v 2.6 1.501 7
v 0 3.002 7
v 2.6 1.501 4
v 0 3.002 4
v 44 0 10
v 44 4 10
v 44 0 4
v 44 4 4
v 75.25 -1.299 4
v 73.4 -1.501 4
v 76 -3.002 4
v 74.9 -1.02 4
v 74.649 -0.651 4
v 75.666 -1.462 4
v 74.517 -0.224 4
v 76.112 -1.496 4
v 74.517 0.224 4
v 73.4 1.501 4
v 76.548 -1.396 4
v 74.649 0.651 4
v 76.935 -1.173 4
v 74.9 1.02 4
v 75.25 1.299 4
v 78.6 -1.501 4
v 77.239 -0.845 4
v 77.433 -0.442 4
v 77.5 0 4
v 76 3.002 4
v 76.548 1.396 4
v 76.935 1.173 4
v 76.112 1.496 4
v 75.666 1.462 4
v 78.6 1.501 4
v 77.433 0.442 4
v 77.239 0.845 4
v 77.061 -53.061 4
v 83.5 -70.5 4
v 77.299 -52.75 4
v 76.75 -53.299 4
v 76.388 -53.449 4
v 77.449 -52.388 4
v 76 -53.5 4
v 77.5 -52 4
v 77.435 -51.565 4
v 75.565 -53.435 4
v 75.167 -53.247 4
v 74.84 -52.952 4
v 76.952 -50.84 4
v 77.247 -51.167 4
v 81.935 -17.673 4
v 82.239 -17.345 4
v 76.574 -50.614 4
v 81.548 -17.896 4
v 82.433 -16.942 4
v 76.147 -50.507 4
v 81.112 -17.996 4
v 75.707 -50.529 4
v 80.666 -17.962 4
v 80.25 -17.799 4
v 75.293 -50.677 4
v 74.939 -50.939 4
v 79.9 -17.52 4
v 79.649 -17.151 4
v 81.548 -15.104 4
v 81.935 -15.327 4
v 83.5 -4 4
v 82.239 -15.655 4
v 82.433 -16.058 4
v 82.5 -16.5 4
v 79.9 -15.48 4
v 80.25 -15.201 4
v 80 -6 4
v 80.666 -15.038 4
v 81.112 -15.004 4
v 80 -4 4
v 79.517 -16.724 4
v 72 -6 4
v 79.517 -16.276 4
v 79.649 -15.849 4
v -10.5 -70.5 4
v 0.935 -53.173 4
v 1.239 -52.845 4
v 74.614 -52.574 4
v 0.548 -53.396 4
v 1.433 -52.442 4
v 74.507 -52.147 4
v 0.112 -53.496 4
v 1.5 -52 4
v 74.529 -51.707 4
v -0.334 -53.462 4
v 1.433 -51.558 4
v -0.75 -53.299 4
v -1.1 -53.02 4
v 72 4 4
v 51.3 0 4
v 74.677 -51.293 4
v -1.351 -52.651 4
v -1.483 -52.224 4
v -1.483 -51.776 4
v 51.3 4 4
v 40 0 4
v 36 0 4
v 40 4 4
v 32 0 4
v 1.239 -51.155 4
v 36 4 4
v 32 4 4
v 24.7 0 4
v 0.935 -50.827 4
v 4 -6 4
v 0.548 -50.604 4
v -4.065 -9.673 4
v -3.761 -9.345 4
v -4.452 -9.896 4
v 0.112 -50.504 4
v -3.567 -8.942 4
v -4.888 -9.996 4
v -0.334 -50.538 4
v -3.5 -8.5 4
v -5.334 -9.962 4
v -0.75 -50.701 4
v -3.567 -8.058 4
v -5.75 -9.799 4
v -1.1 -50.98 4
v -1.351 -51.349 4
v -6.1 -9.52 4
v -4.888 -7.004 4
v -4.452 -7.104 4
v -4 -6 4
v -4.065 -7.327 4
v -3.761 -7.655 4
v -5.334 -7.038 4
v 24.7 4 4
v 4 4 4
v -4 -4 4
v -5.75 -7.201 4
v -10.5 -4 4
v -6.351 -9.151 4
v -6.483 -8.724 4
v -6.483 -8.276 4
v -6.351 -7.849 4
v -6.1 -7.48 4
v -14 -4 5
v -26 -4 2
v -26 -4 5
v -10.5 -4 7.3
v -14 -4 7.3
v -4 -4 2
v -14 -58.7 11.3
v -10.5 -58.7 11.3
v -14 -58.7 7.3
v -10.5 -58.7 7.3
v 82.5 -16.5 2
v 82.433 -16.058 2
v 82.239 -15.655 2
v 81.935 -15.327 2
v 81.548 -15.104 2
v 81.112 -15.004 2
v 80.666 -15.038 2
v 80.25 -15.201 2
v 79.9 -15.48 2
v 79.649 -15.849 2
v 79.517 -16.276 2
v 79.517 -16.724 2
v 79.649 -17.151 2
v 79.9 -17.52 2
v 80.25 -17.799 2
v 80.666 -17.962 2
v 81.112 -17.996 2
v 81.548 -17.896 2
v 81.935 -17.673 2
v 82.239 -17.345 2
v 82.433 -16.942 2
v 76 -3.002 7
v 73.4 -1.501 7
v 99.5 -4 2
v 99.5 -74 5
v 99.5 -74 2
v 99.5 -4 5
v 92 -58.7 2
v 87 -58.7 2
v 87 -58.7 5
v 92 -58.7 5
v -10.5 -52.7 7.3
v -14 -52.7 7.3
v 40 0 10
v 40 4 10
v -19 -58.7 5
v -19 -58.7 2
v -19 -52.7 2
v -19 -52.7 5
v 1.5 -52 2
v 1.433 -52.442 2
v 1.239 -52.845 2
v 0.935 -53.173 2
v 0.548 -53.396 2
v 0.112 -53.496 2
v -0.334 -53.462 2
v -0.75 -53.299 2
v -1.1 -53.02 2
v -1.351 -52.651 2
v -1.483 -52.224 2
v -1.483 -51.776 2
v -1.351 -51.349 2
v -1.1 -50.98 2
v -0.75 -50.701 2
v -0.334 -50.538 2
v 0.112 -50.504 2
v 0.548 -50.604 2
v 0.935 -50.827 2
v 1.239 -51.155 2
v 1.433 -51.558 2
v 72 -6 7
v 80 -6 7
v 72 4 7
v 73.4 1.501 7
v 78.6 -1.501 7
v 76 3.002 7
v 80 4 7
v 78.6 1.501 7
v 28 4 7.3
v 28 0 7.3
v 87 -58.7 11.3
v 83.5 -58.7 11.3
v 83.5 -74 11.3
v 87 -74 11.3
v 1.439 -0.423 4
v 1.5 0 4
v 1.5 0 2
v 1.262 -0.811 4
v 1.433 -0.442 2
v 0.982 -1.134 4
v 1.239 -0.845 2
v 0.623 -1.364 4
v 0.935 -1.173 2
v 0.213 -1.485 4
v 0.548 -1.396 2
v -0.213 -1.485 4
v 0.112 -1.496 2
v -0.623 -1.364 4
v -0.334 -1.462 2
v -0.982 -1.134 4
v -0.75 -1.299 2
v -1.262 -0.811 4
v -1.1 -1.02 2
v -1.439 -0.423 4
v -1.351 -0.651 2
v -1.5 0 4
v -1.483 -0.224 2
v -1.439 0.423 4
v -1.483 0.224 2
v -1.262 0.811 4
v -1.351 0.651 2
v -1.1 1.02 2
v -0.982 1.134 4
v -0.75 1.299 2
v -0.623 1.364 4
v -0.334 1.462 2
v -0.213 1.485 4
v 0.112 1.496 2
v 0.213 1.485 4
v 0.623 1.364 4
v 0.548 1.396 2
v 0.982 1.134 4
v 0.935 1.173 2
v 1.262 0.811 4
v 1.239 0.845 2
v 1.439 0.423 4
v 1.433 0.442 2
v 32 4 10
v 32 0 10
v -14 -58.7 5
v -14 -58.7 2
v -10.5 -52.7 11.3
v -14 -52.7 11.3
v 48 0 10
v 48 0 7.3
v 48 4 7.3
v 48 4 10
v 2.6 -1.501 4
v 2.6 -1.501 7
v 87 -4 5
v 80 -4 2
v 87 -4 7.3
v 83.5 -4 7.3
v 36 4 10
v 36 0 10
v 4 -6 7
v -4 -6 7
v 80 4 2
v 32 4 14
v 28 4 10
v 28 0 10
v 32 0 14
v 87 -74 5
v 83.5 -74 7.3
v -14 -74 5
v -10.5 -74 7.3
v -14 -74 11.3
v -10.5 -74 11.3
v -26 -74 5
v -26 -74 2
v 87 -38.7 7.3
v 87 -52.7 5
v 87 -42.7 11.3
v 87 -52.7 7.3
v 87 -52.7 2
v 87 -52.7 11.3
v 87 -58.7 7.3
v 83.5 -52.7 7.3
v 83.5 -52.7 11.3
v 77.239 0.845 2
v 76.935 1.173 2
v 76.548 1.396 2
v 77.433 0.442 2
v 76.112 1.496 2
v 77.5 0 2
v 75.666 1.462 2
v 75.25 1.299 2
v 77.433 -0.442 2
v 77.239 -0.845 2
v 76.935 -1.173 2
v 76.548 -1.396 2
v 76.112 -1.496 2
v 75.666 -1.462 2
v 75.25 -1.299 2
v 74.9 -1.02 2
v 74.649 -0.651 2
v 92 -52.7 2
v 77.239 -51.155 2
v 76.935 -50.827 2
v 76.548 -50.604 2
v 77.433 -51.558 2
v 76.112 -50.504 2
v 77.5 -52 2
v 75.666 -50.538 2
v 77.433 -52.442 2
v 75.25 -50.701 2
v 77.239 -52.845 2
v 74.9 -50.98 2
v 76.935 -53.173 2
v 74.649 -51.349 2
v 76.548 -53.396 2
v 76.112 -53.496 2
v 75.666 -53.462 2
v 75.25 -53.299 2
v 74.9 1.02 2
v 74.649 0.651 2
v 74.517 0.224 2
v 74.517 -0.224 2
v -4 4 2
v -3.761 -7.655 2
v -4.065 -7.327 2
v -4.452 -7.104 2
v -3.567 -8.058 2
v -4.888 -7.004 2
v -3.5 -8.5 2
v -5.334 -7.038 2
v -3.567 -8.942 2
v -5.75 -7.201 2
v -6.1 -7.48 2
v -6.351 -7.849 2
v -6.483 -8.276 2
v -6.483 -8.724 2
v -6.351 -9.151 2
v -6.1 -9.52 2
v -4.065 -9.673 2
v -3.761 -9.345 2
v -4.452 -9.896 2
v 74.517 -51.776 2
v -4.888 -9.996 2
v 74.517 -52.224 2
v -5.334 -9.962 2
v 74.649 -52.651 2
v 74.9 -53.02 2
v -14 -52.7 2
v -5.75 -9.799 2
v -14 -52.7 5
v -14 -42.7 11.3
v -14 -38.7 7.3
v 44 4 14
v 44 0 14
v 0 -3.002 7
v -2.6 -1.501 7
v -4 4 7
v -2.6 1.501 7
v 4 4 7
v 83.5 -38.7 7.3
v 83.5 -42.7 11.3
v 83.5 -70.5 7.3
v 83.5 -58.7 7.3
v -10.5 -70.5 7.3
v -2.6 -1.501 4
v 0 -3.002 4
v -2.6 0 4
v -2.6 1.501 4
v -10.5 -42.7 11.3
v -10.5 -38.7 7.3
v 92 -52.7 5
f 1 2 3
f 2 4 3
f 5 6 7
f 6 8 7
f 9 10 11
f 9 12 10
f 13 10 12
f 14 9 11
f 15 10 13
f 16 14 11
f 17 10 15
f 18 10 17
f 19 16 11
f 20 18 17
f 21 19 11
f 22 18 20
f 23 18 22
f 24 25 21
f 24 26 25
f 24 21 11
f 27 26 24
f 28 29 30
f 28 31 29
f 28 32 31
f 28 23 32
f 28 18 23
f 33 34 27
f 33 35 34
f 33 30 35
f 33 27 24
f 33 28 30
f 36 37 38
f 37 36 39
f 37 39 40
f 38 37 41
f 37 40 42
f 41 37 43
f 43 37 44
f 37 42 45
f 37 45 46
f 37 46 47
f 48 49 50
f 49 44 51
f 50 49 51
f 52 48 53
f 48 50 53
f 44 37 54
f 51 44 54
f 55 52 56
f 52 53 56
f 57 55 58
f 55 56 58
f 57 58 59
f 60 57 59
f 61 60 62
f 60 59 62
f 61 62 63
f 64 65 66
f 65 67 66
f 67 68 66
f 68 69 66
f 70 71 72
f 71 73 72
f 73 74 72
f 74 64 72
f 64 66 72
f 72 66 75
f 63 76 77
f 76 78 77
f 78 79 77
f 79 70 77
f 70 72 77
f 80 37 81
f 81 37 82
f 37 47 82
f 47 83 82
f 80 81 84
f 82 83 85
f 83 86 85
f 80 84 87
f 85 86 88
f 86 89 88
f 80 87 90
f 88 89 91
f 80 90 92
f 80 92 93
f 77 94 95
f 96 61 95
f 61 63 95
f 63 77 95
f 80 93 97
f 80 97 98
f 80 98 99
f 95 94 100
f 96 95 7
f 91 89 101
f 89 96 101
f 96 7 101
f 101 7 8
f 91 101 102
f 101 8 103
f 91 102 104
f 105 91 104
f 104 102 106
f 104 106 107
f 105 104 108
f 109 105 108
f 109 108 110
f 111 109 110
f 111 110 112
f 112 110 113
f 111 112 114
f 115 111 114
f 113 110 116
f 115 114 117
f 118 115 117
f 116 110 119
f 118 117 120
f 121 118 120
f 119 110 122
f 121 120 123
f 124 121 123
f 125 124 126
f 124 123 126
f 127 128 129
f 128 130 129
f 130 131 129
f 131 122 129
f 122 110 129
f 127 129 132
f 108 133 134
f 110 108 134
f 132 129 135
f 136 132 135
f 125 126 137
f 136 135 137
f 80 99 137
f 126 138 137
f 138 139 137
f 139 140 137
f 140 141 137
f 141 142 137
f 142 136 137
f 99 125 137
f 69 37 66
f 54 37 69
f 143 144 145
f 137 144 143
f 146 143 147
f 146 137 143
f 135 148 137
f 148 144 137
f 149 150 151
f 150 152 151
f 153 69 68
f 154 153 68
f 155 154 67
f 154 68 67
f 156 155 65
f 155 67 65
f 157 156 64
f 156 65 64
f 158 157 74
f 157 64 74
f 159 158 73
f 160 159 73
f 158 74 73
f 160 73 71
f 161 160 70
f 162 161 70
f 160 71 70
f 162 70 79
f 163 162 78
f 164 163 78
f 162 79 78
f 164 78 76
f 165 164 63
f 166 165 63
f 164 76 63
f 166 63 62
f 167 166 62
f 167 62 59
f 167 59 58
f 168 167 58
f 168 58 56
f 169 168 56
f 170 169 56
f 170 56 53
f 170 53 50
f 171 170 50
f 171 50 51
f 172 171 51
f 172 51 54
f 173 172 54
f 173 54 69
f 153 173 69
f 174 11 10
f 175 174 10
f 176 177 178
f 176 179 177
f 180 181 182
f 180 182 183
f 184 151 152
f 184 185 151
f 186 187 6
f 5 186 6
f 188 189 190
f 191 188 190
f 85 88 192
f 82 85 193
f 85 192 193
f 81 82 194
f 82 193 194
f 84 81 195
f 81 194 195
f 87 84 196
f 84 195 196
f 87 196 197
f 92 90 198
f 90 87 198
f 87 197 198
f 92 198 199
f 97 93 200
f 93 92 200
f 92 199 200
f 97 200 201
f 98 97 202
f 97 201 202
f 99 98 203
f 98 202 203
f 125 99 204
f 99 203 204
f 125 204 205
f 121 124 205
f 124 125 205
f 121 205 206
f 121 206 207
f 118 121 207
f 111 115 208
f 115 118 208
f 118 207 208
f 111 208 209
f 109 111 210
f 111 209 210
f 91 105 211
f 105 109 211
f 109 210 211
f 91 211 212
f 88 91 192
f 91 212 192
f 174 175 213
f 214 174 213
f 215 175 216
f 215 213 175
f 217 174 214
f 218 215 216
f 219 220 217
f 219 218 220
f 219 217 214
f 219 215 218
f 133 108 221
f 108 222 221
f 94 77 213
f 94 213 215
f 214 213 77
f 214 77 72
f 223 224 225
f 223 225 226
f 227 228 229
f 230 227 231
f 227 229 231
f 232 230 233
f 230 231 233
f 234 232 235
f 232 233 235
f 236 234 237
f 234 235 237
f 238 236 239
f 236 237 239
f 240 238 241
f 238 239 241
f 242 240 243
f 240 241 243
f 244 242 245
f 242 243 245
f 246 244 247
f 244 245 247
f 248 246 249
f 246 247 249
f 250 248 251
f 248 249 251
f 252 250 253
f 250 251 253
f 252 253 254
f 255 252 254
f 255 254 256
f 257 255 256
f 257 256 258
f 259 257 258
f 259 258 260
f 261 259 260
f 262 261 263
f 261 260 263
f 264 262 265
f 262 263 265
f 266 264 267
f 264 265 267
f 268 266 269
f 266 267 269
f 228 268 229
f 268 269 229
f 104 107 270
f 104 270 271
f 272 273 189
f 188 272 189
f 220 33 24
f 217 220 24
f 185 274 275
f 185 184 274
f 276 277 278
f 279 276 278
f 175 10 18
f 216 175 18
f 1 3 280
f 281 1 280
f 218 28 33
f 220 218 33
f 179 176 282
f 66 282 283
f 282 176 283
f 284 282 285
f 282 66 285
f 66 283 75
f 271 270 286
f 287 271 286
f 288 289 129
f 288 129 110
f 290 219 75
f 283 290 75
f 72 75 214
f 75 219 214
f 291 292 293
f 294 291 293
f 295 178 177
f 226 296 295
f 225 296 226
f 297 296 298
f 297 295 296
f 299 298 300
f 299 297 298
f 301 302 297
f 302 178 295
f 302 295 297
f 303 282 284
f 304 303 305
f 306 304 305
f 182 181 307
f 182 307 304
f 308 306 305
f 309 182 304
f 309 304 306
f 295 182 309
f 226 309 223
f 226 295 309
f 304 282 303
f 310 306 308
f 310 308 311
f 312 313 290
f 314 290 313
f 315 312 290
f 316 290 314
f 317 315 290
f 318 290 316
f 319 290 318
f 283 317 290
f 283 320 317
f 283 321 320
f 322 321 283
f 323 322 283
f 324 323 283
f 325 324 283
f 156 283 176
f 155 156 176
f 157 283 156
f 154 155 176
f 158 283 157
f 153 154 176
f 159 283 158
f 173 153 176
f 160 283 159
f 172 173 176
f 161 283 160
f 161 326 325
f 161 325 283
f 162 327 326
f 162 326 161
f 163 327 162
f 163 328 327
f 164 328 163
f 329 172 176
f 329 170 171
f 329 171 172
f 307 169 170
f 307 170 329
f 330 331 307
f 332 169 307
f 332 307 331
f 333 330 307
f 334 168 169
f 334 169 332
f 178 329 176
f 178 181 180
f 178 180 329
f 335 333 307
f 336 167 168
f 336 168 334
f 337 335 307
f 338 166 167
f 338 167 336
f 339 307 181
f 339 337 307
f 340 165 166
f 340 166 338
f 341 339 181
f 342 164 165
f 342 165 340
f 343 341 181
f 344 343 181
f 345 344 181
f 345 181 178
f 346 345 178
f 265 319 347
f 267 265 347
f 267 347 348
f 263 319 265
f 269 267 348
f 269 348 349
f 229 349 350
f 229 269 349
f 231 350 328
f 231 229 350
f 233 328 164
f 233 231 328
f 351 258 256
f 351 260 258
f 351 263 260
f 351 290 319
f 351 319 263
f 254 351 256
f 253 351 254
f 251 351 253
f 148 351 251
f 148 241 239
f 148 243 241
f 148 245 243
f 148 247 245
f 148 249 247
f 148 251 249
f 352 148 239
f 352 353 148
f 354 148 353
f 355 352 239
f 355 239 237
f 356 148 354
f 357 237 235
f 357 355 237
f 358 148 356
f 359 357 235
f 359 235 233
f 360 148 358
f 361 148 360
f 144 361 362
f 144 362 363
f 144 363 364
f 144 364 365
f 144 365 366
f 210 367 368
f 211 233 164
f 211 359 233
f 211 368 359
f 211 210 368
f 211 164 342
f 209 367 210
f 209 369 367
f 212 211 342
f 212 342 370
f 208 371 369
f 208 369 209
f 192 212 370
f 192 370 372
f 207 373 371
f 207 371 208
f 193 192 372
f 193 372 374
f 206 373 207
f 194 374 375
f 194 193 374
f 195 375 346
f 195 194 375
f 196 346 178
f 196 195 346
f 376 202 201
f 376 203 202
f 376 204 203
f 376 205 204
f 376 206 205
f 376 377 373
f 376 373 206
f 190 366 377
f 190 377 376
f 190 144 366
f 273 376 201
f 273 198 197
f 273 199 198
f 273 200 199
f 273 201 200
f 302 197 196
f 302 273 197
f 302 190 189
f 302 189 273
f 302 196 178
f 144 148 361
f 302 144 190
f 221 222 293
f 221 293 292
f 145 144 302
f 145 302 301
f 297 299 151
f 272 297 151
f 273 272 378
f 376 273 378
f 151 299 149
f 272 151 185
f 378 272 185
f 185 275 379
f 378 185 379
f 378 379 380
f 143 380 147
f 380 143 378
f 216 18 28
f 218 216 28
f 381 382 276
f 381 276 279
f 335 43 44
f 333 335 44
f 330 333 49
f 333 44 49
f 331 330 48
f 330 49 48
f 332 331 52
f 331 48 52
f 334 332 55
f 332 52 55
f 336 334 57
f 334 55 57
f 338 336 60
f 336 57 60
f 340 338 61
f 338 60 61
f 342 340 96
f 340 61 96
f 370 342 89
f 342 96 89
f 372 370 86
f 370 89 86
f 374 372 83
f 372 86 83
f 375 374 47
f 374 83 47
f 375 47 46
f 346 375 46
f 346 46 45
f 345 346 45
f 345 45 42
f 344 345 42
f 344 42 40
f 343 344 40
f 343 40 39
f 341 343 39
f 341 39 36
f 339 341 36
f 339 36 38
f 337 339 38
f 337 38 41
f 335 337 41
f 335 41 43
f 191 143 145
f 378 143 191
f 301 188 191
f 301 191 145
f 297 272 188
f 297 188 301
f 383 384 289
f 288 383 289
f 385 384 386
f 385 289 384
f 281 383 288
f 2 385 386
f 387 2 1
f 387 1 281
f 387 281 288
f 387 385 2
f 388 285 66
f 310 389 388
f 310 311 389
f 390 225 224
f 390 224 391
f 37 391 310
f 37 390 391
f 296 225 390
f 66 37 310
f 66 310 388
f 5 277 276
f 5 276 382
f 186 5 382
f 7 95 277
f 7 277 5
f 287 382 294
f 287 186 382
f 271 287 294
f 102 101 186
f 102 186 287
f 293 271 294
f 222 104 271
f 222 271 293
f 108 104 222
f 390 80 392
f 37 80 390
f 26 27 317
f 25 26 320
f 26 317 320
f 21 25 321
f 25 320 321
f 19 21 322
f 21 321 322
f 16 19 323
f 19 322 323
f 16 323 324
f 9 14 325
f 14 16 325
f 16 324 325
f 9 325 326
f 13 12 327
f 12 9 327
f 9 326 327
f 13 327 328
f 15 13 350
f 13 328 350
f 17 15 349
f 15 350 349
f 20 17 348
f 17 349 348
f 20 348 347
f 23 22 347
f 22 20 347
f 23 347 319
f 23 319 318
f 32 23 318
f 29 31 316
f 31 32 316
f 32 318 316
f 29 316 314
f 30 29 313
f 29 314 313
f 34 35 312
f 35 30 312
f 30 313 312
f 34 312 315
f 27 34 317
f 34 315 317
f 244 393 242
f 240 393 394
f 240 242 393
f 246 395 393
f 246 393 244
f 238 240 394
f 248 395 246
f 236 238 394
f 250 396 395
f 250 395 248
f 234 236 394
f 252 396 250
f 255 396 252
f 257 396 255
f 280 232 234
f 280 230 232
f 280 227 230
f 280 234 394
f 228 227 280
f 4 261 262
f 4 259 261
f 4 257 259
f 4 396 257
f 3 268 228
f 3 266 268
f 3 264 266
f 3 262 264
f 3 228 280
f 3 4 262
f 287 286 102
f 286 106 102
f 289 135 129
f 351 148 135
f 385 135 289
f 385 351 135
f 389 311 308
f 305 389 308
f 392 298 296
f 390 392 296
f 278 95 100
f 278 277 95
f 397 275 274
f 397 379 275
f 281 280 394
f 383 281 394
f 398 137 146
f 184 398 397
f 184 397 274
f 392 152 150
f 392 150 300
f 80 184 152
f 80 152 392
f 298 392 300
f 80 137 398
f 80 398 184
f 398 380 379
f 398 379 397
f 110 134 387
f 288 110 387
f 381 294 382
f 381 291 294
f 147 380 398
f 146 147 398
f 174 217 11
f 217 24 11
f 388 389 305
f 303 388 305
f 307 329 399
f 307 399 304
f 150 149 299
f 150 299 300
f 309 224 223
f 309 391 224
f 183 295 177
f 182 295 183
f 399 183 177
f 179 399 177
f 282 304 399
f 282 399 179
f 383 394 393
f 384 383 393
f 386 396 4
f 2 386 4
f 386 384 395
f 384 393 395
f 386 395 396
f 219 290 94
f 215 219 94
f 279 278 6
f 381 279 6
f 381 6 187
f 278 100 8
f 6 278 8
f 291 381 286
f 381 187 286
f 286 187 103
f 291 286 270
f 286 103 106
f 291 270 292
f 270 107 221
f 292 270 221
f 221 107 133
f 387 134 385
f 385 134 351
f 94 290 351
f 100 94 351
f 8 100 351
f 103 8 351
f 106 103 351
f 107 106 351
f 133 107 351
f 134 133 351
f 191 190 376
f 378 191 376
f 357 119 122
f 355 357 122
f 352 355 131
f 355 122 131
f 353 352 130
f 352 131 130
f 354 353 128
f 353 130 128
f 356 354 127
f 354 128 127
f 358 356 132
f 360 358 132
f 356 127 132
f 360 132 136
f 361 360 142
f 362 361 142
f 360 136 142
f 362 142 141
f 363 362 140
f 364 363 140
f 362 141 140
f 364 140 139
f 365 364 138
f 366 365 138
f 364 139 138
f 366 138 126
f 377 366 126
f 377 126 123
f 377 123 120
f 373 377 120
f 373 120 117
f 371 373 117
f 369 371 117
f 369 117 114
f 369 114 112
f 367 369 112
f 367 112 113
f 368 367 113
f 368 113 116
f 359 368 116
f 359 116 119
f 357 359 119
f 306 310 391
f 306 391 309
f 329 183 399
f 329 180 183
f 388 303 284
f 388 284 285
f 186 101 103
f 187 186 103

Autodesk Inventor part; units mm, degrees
ref_plane "YZ Plane" through (0, 0, 0) normal (1, 0, 0) x (0, 1, 0)
ref_plane "XZ Plane" through (0, 0, 0) normal (0, 1, 0) x (-1, 0, 0)
ref_plane "Work Plane1" through (0, 0, 2) normal (0, 0, 1) x (1, 0, 0)
sketch "Sketch1" plane through (0, 0, 2) normal (0, 0, 1) x (1, 0, 0)
  arc A0 (0, 3.5) -> (-3.5, 0) centre (0, 0) ccw construction
  line L0 (-3.5, -52) -> (-3.5, 0) construction
  arc A1 (-3.5, -52) -> (0, -55.5) centre (0, -52) ccw construction
  line L1 (76, -55.5) -> (0, -55.5) construction
  arc A2 (76, -55.5) -> (79.5, -52) centre (76, -52) ccw construction
  line L2 (79.5, 0) -> (79.5, -52) construction
  arc A3 (79.5, 0) -> (76, 3.5) centre (76, 0) ccw construction
  line L3 (0, 3.5) -> (76, 3.5) construction
  circle A4 centre (0, -52) radius 1.4224 construction
  circle A5 centre (0, 0) radius 1.4224 construction
  circle A6 centre (76, 0) radius 1.4224 construction
  circle A7 centre (76, -52) radius 1.4224 construction
  circle A8 centre (25.43, -38.5) radius 1.4224 construction
  circle A9 centre (76.11, -18.5) radius 1.4224 construction
  circle A10 centre (76, 0) radius 1.5
  circle A11 centre (76, -52) radius 1.5
  circle A12 centre (76, -52) radius 3.5
  circle A13 centre (76, 0) radius 3.5
  circle A14 centre (0, -52) radius 1.5
  circle A15 centre (0, -52) radius 3.5
  circle A16 centre (0, 0) radius 1.5
  circle A17 centre (0, 0) radius 3.5
  dimension "d0" = 3
  dimension "d1" = 3
  dimension "d2" = 7
  dimension "d3" = 7
  dimension "d4" = 3
  dimension "d5" = 7
  dimension "d6" = 3
  dimension "d7" = 7
extrude "Extrusion1" add sketch "Sketch1" against normal blind 4.5
sketch "Sketch2" plane through (0, 0, 2) normal (0, 0, 1) x (1, 0, 0)
  circle A0 centre (76, -52) radius 1.5 projected
  circle A1 centre (76, -52) radius 3.5 projected
  circle A2 centre (0, -52) radius 3.5 projected
  circle A3 centre (0, 0) radius 1.5 projected
  circle A4 centre (0, 0) radius 3.5 projected
  circle A5 centre (76, 0) radius 1.5 projected
  circle A6 centre (76, 0) radius 3.5 projected
  circle A7 centre (76, -52) radius 1.5 projected
  line L0 (76, -52) -> (76, -56)
  circle A8 centre (76, -52) radius 3.5 projected
  circle A9 centre (0, 0) radius 3.5 projected
  line L1 (0, 0) -> (-4, 0)
  circle A10 centre (0, -52) radius 1.5 projected
  circle A11 centre (0, -52) radius 3.5 projected
  line L2 (76, -56) -> (80, -56)
  line L3 (-4, 0) -> (-4, 4)
  line L4 (-4, 4) -> (80, 4)
  line L5 (80, 4) -> (80, -56)
  line L6 (80, -56) -> (-4, -56)
  line L7 (-4, -56) -> (-4, 4)
  point P0 (0, 0)
  dimension "d10" = 4
  dimension "d12" = 4
  dimension "d21" = 4
  dimension "d22" = 4
extrude "Extrusion2" add sketch "Sketch2" along normal blind 2 contours A1 | A4 | L6 L7 L3 L4 L5 L2 | A2 | A6
sketch "Sketch3" plane through (0, 0, 4) normal (0, 0, 1) x (1, 0, 0)
  circle A0 centre (76, 0) radius 1.5 construction
  circle A1 centre (0, 0) radius 1.5 construction
  circle A2 centre (0, -52) radius 1.5 construction
  circle A3 centre (76, -52) radius 1.5 construction
  circle A4 centre (0, 0) radius 1.5 construction
  line L0 (0, 0) -> (2.6, 0) construction
  line L1 (2.6, -1.5011) -> (0, -3.0022)
  line L2 (0, -3.0022) -> (-2.6, -1.5011)
  line L3 (-2.6, -1.5011) -> (-2.6, 1.5011)
  line L4 (-2.6, 1.5011) -> (0, 3.0022)
  line L5 (0, 3.0022) -> (2.6, 1.5011)
  line L6 (2.6, 1.5011) -> (2.6, -1.5011)
  line L7 (3.3236, -3.218) -> (-3.3236, 3.218) construction
  line L8 (-3.3236, -3.218) -> (3.3236, 3.218) construction
  line L9 (80, 4) -> (-4, 4) projected
  line L10 (-4, 4) -> (-4, -56) projected
  line L11 (4, -4) -> (-4, -4)
  line L12 (-4, -4) -> (-4, 4)
  line L13 (-4, 4) -> (4, 4)
  line L14 (4, 4) -> (4, -4)
  circle A5 centre (0, 0) radius 1.5 projected
  line L15 (4, -4) -> (-4, 4) construction
  line L16 (-4, -4) -> (4, 4) construction
  point P0 (0, 0)
  dimension "d18" = 2.6
extrude "Extrusion3" add sketch "Sketch3" along normal blind 3 contours L14 L11 L10 L9
ref_plane "Work Plane2" through (38, -56, 2) normal (1, 0, 0) x (0, 0, -1)
mirror "Mirror1" about plane through (38, -56, 2) normal (1, 0, 0) of "Extrusion3"
sketch "Sketch4" plane through (0, 0, 4) normal (0, 0, 1) x (1, 0, 0)
  circle A0 centre (76, -52) radius 1.5 projected
  circle A1 centre (0, -52) radius 1.5 projected
  line L0 (80, -4) -> (72, -4) projected
  line L1 (72, -4) -> (72, 4) projected
  line L2 (72, 4) -> (4, 4) projected
  line L3 (4, 4) -> (4, -4) projected
  line L4 (4, -4) -> (-4, -4) projected
  line L5 (-4, -4) -> (-4, -56) projected
  line L6 (-4, -56) -> (80, -56) projected
  line L7 (80, -56) -> (80, -4) projected
  line L8 (-4, 4) -> (-4, -56) projected
  line L9 (-4, -56) -> (-4, 4)
  line L10 (-4, -26) -> (38, -26)
  line L11 (-11, -48) -> (87, -48)
  line L12 (87, -48) -> (87, -4)
  line L13 (87, -4) -> (-11, -4)
  line L14 (-11, -4) -> (-11, -48)
  line L15 (-11, -48) -> (87, -4) construction
  line L16 (87, -48) -> (-11, -4) construction
  point P0 (0, 0)
  dimension "d23" = 98
  dimension "d24" = 44
extrude "Extrusion4" add sketch "Sketch4" against normal blind 2 contours L7 L11 L5 L4 L13 L0 | L13 L12 L11 L7 | L11 L14 L13 L5
sketch "Sketch5" plane through (0, 0, 4) normal (0, 0, 1) x (1, 0, 0)
  circle A0 centre (76, 0) radius 1.5 projected
  line L0 (76, 0) -> (76, -20)
  line L1 (76, -20) -> (81, -20)
  circle A1 centre (81, -20) radius 1.5
  circle A2 centre (0, 0) radius 1.5 projected
  line L2 (0, 0) -> (0, -12)
  line L3 (0, -12) -> (-5, -12)
  circle A3 centre (-5, -12) radius 1.5
  point P0 (0, 0)
  dimension "d27" = 20
  dimension "d28" = 5
  dimension "d29" = 3
  dimension "d30" = 12
  dimension "d31" = 5
  dimension "d32" = 3
extrude "Extrusion5" cut sketch "Sketch5" against normal blind 2 contours A1 | A3
sketch "Sketch7" plane through (-11, -48, 4) normal (-1, 0, 0) x (0, 0, 1)
  line L0 (0, 44) -> (0, 0) projected
  line L1 (0, 44) -> (-2, 44) projected
  line L2 (-2, 0) -> (-2, 44) projected
  line L3 (0, 0) -> (-2, 0) projected
  point P0 (-4, 48)
extrude "Extrusion6" add sketch "Sketch7" along normal blind 3
sketch "Sketch6" plane through (0, 0, 4) normal (0, 0, 1) x (1, 0, 0)
  circle A0 centre (81, -20) radius 1.5 projected
  circle A1 centre (-5, -12) radius 1.5 projected
  circle A2 centre (0, -52) radius 1.5 projected
  circle A3 centre (76, -52) radius 1.5 projected
  line L0 (72, -4) -> (72, 4) projected
  line L1 (72, 4) -> (4, 4) projected
  line L2 (4, 4) -> (4, -4) projected
  line L3 (4, -4) -> (-4, -4) projected
  line L4 (-4, -4) -> (-14, -4) projected
  line L5 (-14, -48) -> (-4, -48) projected
  line L6 (-4, -48) -> (-4, -56) projected
  line L7 (-4, -56) -> (80, -56) projected
  line L8 (80, -56) -> (80, -48) projected
  line L9 (80, -48) -> (87, -48) projected
  line L10 (87, -48) -> (87, -4) projected
  line L11 (87, -4) -> (80, -4) projected
  line L12 (80, -4) -> (72, -4) projected
  line L13 (81, -20) -> (83.5, -20)
  line L14 (83.5, -20) -> (83.5, -4)
  line L15 (80, -4) -> (87, -4) projected
  line L16 (87, -4) -> (83.5, -4)
  line L17 (87, -48) -> (87, -4) projected
  line L18 (87, -4) -> (87, -48)
  line L19 (83.5, -20) -> (83.5, -48)
  line L20 (80, -48) -> (87, -48) projected
  line L21 (87, -48) -> (83.5, -48)
  circle A4 centre (-5, -12) radius 1.5 projected
  line L22 (-5, -12) -> (-10.5, -12)
  line L23 (-14, -48) -> (-14, -4) projected
  line L24 (-10.5, -12) -> (-10.5, -4)
  line L25 (-4, -4) -> (-14, -4) projected
  line L26 (-14, -4) -> (-10.5, -4)
  line L27 (-4, -48) -> (-14, -48) projected
  line L28 (-14, -4) -> (-14, -48)
  line L29 (-14, -48) -> (-10.5, -48)
  line L30 (-10.5, -48) -> (-10.5, -12)
  point P0 (0, 0)
  dimension "d35" = 2.5
  dimension "d36" = 5.5
extrude "Extrusion7" add sketch "Sketch6" along normal blind 3.3 contours L14 L11 L10 L9 L19 | L5 L23 L4 L24 L30
sketch "Sketch8" plane through (0, 0, 4) normal (0, 0, 1) x (1, 0, 0)
  line L0 (83.5, -48) -> (83.5, -4) projected
  line L1 (83.5, -4) -> (80, -4) projected
  line L2 (80, -4) -> (72, -4) projected
  line L3 (72, -4) -> (72, 4) projected
  line L4 (72, 4) -> (4, 4) projected
  line L5 (4, 4) -> (4, -4) projected
  line L6 (4, -4) -> (-4, -4) projected
  line L7 (-4, -4) -> (-10.5, -4) projected
  line L8 (-10.5, -4) -> (-10.5, -48) projected
  line L9 (-10.5, -48) -> (-4, -48) projected
  line L10 (-4, -48) -> (-4, -56) projected
  line L11 (-4, -56) -> (80, -56) projected
  line L12 (80, -56) -> (80, -48) projected
  line L13 (80, -48) -> (83.5, -48) projected
  circle A0 centre (81, -20) radius 1.5 projected
  circle A1 centre (-5, -12) radius 1.5 projected
  circle A2 centre (0, -52) radius 1.5 projected
  circle A3 centre (76, -52) radius 1.5 projected
  circle A4 centre (81, -20) radius 1.5 projected
  line L14 (81, -20) -> (81, -74)
  line L15 (-14, -4) -> (-14, -48) projected
  line L16 (-14, -48) -> (-10.5, -48) projected
  line L17 (-10.5, -48) -> (-10.5, -4) projected
  line L18 (-10.5, -4) -> (-14, -4) projected
  line L19 (87, -48) -> (87, -4) projected
  line L20 (87, -4) -> (83.5, -4) projected
  line L21 (83.5, -4) -> (83.5, -48) projected
  line L22 (83.5, -48) -> (87, -48) projected
  line L23 (81, -74) -> (87, -74)
  line L24 (80, -48) -> (87, -48)
  line L25 (87, -48) -> (87, -74)
  line L26 (87, -74) -> (80, -74)
  line L27 (80, -74) -> (80, -48)
  line L28 (-10.5, -48) -> (-4, -48)
  line L29 (-4, -48) -> (-4, -74)
  line L30 (-4, -74) -> (-10.5, -74)
  line L31 (-10.5, -74) -> (-10.5, -48)
  line L32 (-4, -74) -> (80, -74)
  line L33 (80, -74) -> (80, -56)
  line L34 (80, -56) -> (-4, -56)
  line L35 (-4, -56) -> (-4, -74)
  line L36 (-4, -48) -> (-14, -48) projected
  line L37 (-14, -48) -> (-10.5, -48)
  line L38 (-10.5, -48) -> (-10.5, -74)
  line L39 (-10.5, -74) -> (-14, -74)
  line L40 (-14, -74) -> (-14, -48)
  point P0 (0, 0)
  dimension "d41" = 54
extrude "Extrusion8" add sketch "Sketch8" against normal blind 2 contours L22 L25 L23 L14 L13 | L14 L26 L27 L12 L13 | L27 L32 L29 L11 | L29 L30 L31 L9 L10 | L39 L40 L16 L31 | L16 L15 L18 L8
sketch "Sketch9" plane through (0, 0, 4) normal (0, 0, 1) x (1, 0, 0)
  line L0 (83.5, -48) -> (83.5, -4) projected
  line L1 (83.5, -4) -> (80, -4) construction
  line L2 (80, -4) -> (72, -4) construction
  line L3 (72, -4) -> (72, 4) construction
  line L4 (72, 4) -> (4, 4) construction
  line L5 (4, 4) -> (4, -4) construction
  line L6 (4, -4) -> (-4, -4) construction
  line L7 (-4, -4) -> (-10.5, -4) projected
  line L8 (-10.5, -4) -> (-10.5, -48) projected
  line L9 (-14, -48) -> (-10.5, -48) projected
  line L10 (-14, -48) -> (-14, -74) projected
  line L11 (-14, -74) -> (87, -74) projected
  line L12 (87, -74) -> (87, -48) projected
  line L13 (83.5, -48) -> (87, -48) projected
  circle A0 centre (81, -20) radius 1.5 construction
  circle A1 centre (-5, -12) radius 1.5 projected
  circle A2 centre (0, -52) radius 1.5 projected
  circle A3 centre (76, -52) radius 1.5 projected
  line L14 (-14, -74) -> (87, -74) projected
  line L15 (-14, -48) -> (-10.5, -48)
  line L16 (-10.5, -48) -> (-10.5, -74)
  line L17 (-10.5, -74) -> (-14, -74)
  line L18 (-14, -74) -> (-14, -48)
  line L19 (87, -48) -> (87, -4) projected
  line L20 (87, -48) -> (83.5, -48)
  line L21 (83.5, -48) -> (83.5, -74)
  line L22 (83.5, -74) -> (87, -74)
  line L23 (87, -74) -> (87, -48)
  line L24 (83.5, -74) -> (-10.5, -74)
  line L25 (-10.5, -74) -> (-10.5, -70.7)
  line L26 (-10.5, -70.7) -> (83.5, -70.7)
  line L27 (83.5, -70.7) -> (83.5, -74)
  point P0 (0, 0)
  dimension "d44" = 3.3
extrude "Extrusion9" add sketch "Sketch9" along normal up to surface (3.3 mm away) contours L9 L16 L11 L10 | L26 L21 L11 L16 | L21 L13 L12 L11
sketch "Sketch10" plane through (-14, -48, 4) normal (-1, 0, 0) x (0, 0, 1)
  line L0 (-6.5, 51.5) -> (-6.5, 44.5) projected
  line L1 (-2, 51.5) -> (-2, 44.5) projected
  line L2 (-6.5, -0.5) -> (-6.5, -7.5) projected
  line L3 (-2, -0.5) -> (-2, -7.5) projected
  line L4 (-6.5, 51.5) -> (-6.5, 44.5) projected
  line L5 (-6.5, 51.5) -> (-2, 51.5)
  line L6 (-2, 51.5) -> (-2, 44.5)
  line L7 (-2, 44.5) -> (-6.5, 44.5)
  line L8 (-6.5, 44.5) -> (-6.5, 51.5)
  line L9 (-2, -0.5) -> (-6.5, -0.5)
  line L10 (-6.5, -0.5) -> (-6.5, -7.5)
  line L11 (-6.5, -7.5) -> (-2, -7.5)
  line L12 (-2, -7.5) -> (-2, -0.5)
  point P0 (-4, 48)
extrude "Extrusion10" cut sketch "Sketch10" against normal through all
sketch "Sketch11" plane through (0, 0, 7.3) normal (0, 0, 1) x (1, 0, 0)
  line L0 (-14, -4) -> (-14, -74) projected
  line L1 (87, -74) -> (-14, -74) projected
  line L2 (87, -4) -> (87, -74) projected
  line L3 (87, -4) -> (83.5, -4) projected
  line L4 (83.5, -4) -> (83.5, -70.7) projected
  line L5 (-10.5, -70.7) -> (83.5, -70.7) projected
  line L6 (-10.5, -4) -> (-10.5, -70.7) projected
  line L7 (-10.5, -4) -> (-14, -4) projected
  line L8 (-10.5, -70.7) -> (-10.5, -58.7)
  line L9 (-10.5, -4) -> (-10.5, -70.7) projected
  line L10 (-10.5, -70.7) -> (-10.5, -52.7)
  line L11 (-14, -4) -> (-14, -74) projected
  line L12 (-10.5, -52.7) -> (-14, -52.7)
  line L13 (-14, -52.7) -> (-14, -42.7)
  line L14 (-14, -42.7) -> (-10.5, -42.7)
  line L15 (-10.5, -42.7) -> (-10.5, -52.7)
  line L16 (-10.5, -58.7) -> (-14, -58.7)
  line L17 (-14, -58.7) -> (-14, -74)
  line L18 (-14, -74) -> (-10.5, -74)
  line L19 (-10.5, -74) -> (-10.5, -58.7)
  line L20 (87, -4) -> (87, -74) projected
  line L21 (83.5, -42.7) -> (87, -42.7)
  line L22 (87, -42.7) -> (87, -52.7)
  line L23 (87, -52.7) -> (83.5, -52.7)
  line L24 (83.5, -52.7) -> (83.5, -42.7)
  line L25 (83.5, -70.7) -> (83.5, -4) projected
  line L26 (83.5, -58.7) -> (87, -58.7)
  line L27 (87, -58.7) -> (87, -74)
  line L28 (87, -74) -> (83.5, -74)
  line L29 (83.5, -74) -> (83.5, -58.7)
  point P0 (0, 0)
  dimension "d49" = 12
  dimension "d50" = 18
  dimension "d51" = 10
extrude "Extrusion11" add sketch "Sketch11" along normal blind 4 contours L14 L6 L12 L0 | L16 L6 L19 L1 L0 | L29 L4 L26 L2 L1 | L4 L21 L2 L23
chamfer "Chamfer1" distance 4 angle 45 2 edges at (85.25, -42.7, 7.3) (-12.25, -42.7, 7.3)
sketch "Sketch12" plane through (0, 0, 7.3) normal (0, 0, 1) x (1, 0, 0)
  line L0 (87, -38.7) -> (83.5, -38.7) projected
  line L1 (87, -4) -> (87, -38.7) projected
  line L2 (87, -4) -> (83.5, -4) projected
  line L3 (83.5, -4) -> (83.5, -38.7) projected
  circle A0 centre (76, -52) radius 1.5 projected
  circle A1 centre (0, -52) radius 1.5 projected
  circle A2 centre (-5, -12) radius 1.5 projected
  circle A3 centre (81, -20) radius 1.5 projected
  line L4 (-10.5, -4) -> (-10.5, -70.7) projected
  line L5 (-10.5, -70.7) -> (83.5, -70.7) projected
  line L6 (83.5, -70.7) -> (83.5, -4) projected
  line L7 (83.5, -4) -> (80, -4) projected
  line L8 (80, -4) -> (72, -4) projected
  line L9 (72, -4) -> (72, 4) projected
  line L10 (72, 4) -> (4, 4) projected
  line L11 (4, 4) -> (4, -4) projected
  line L12 (4, -4) -> (-4, -4) projected
  line L13 (-4, -4) -> (-10.5, -4) projected
  line L14 (87, -4) -> (80, -4)
  line L15 (80, -4) -> (80, -15)
  line L16 (80, -15) -> (87, -15)
  line L17 (87, -15) -> (87, -4)
  point P0 (0, 0)
  dimension "d57" = 7
  dimension "d58" = 11
extrude "Extrusion12" cut sketch "Sketch12" against normal through all contours L16 L3 L2 L1 | L16 L15 L7 L3
sketch "Sketch13" plane through (0, 0, 2) normal (0, 0, -1) x (-1, 0, 0)
  circle A0 centre (-81, -20) radius 1.5 projected
  circle A1 centre (5, -12) radius 1.5 projected
  line L0 (-80, -15) -> (-80, 4) projected
  line L1 (-80, -15) -> (-87, -15) projected
  line L2 (-87, -15) -> (-87, -74) projected
  line L3 (-87, -74) -> (14, -74) projected
  line L4 (14, -4) -> (14, -74) projected
  line L5 (4, -4) -> (14, -4) projected
  line L6 (4, 4) -> (4, -4) projected
  line L7 (-80, 4) -> (4, 4) projected
  circle A2 centre (0, -52) radius 1.5 projected
  circle A3 centre (-76, -52) radius 1.5 projected
  circle A4 centre (-76, 0) radius 1.5 projected
  circle A5 centre (0, 0) radius 1.5 projected
  line L8 (14, -74) -> (24, -74)
  line L9 (24, -74) -> (24, -4)
  line L10 (24, -4) -> (14, -4)
  line L11 (14, -4) -> (14, -74)
  line L12 (-87, -74) -> (-97, -74)
  line L13 (-97, -74) -> (-97, -15)
  line L14 (-97, -15) -> (-87, -15)
  line L15 (-87, -15) -> (-87, -74)
  point P0 (0, 0)
  dimension "d61" = 10
  dimension "d62" = 10
extrude "Extrusion13" add sketch "Sketch13" against normal blind 3 contours L2 L12 L13 L14 | L4 L10 L9 L8
sketch "Sketch14" plane through (0, 0, 2) normal (0, 0, -1) x (-1, 0, 0)
  line L0 (14, -58.7) -> (10.5, -58.7) projected
  line L1 (10.5, -52.7) -> (10.5, -58.7) projected
  line L2 (10.5, -52.7) -> (14, -52.7) projected
  line L3 (14, -52.7) -> (14, -58.7) projected
  line L4 (-83.5, -58.7) -> (-87, -58.7) projected
  line L5 (-87, -52.7) -> (-87, -58.7) projected
  line L6 (-87, -52.7) -> (-83.5, -52.7) projected
  line L7 (-83.5, -52.7) -> (-83.5, -58.7) projected
  line L8 (14, -58.7) -> (14, -74) projected
  line L9 (14, -58.7) -> (19, -58.7)
  line L10 (19, -58.7) -> (19, -52.7)
  line L11 (19, -52.7) -> (14, -52.7)
  line L12 (14, -52.7) -> (14, -58.7)
  line L13 (-87, -58.7) -> (-83.5, -58.7) projected
  line L14 (-87, -58.7) -> (-92, -58.7)
  line L15 (-92, -58.7) -> (-92, -52.7)
  line L16 (-92, -52.7) -> (-87, -52.7)
  line L17 (-87, -52.7) -> (-87, -58.7)
  point P0 (0, 0)
  dimension "d65" = 5
  dimension "d66" = 5
extrude "Extrusion14" cut sketch "Sketch14" against normal through all contours L3 L11 L10 L9 | L14 L15 L16 L5
sketch "Sketch15" plane through (-10.5, -74, 7.3) normal (0, -1, 0) x (1, 0, 0)
  line L0 (107.5, -5.3) -> (-13.5, -5.3) projected
  line L1 (107.5, -5.3) -> (107.5, -2.3) projected
  line L2 (97.5, -2.3) -> (107.5, -2.3) projected
  line L3 (97.5, -2.3) -> (97.5, 4) projected
  line L4 (94, 4) -> (97.5, 4) projected
  line L5 (94, 0) -> (94, 4) projected
  line L6 (94, 0) -> (0, 0) projected
  line L7 (0, 0) -> (0, 4) projected
  line L8 (-3.5, 4) -> (0, 4) projected
  line L9 (-3.5, -2.3) -> (-3.5, 4) projected
  line L10 (-13.5, -2.3) -> (-3.5, -2.3) projected
  line L11 (-13.5, -5.3) -> (-13.5, -2.3) projected
  line L12 (107.5, -5.3) -> (109.5, -5.3)
  line L13 (109.5, -5.3) -> (109.5, -2.3)
  line L14 (109.5, -2.3) -> (107.5, -2.3)
  line L15 (107.5, -2.3) -> (107.5, -5.3)
  point P0 (10.5, -7.3)
  dimension "d69" = 2
extrude "Extrusion15" add sketch "Sketch15" against normal up to surface (59 mm away) contours L1 L14 L13 L12
sketch "Sketch16" plane through (-24, -74, 2) normal (-1, 0, 0) x (0, 0, 1)
  line L0 (0, 0) -> (0, 70) projected
  line L1 (0, 0) -> (3, 0) projected
  line L2 (3, 70) -> (3, 0) projected
  line L3 (0, 70) -> (3, 70) projected
  point P0 (-2, 74)
extrude "Extrusion16" add sketch "Sketch16" along normal blind 3
sketch "Sketch17" plane through (0, 0, 4) normal (0, 0, 1) x (1, 0, 0)
  line L0 (80, -15) -> (80, -4) projected
  line L1 (80, -4) -> (72, -4) projected
  line L2 (72, -4) -> (72, 4) projected
  line L3 (72, 4) -> (4, 4) projected
  line L4 (4, 4) -> (4, -4) projected
  line L5 (4, -4) -> (-4, -4) projected
  line L6 (-4, -4) -> (-10.5, -4) projected
  line L7 (-10.5, -4) -> (-10.5, -70.7) projected
  line L8 (-10.5, -70.7) -> (83.5, -70.7) projected
  line L9 (83.5, -70.7) -> (83.5, -15) projected
  line L10 (83.5, -15) -> (80, -15) projected
  circle A0 centre (76, -52) radius 1.5 projected
  circle A1 centre (0, -52) radius 1.5 projected
  circle A2 centre (-5, -12) radius 1.5 projected
  circle A3 centre (81, -20) radius 1.5 projected
  line L11 (80, 4) -> (-4, 4) projected
  line L12 (38, 4) -> (36, 4)
  line L13 (36, 4) -> (36, 0)
  line L14 (36, 0) -> (38, 0)
  line L15 (38, 0) -> (38, 4)
  line L16 (38, 0) -> (40, 0)
  line L17 (40, 0) -> (40, 4)
  line L18 (40, 4) -> (38, 4)
  line L19 (38, 4) -> (38, 0)
  line L20 (40, 0) -> (44, 0)
  line L21 (36, 0) -> (32, 0)
  line L22 (44, 0) -> (48, 0)
  line L23 (48, 0) -> (48, 4)
  line L24 (48, 4) -> (44, 4)
  line L25 (44, 4) -> (44, 0)
  line L26 (32, 0) -> (28, 0)
  line L27 (28, 0) -> (28, 4)
  line L28 (28, 4) -> (32, 4)
  line L29 (32, 4) -> (32, 0)
  point P0 (0, 0)
  dimension "d74" = 2
  dimension "d75" = 4
  dimension "d76" = 2
  dimension "d77" = 4
  dimension "d78" = 4
  dimension "d79" = 4
  dimension "d80" = 4
  dimension "d81" = 4
  dimension "d82" = 4
  dimension "d83" = 4
extrude "Extrusion17" add sketch "Sketch17" along normal blind 6 contours L23 L22 L25 L3 | L17 L16 L15 L3 | L15 L14 L13 L3 | L3 L29 L26 L27
sketch "Sketch18" plane through (0, 0, 10) normal (0, 0, 1) x (1, 0, 0)
  line L0 (32, 0) -> (32, 4) projected
  line L1 (32, 4) -> (28, 4) projected
  line L2 (28, 4) -> (28, 0) projected
  line L3 (28, 0) -> (32, 0) projected
  line L4 (40, 4) -> (36, 4) projected
  line L5 (36, 4) -> (36, 0) projected
  line L6 (36, 0) -> (40, 0) projected
  line L7 (40, 0) -> (40, 4) projected
  line L8 (44, 0) -> (48, 0) projected
  line L9 (48, 0) -> (48, 4) projected
  line L10 (48, 4) -> (44, 4) projected
  line L11 (44, 4) -> (44, 0) projected
  line L12 (48, 4) -> (44, 4) projected
  line L13 (28, 0) -> (48, 0)
  line L14 (48, 0) -> (48, 4)
  line L15 (48, 4) -> (28, 4)
  line L16 (28, 4) -> (28, 0)
  point P0 (0, 0)
extrude "Extrusion18" add sketch "Sketch18" along normal blind 4
chamfer "Chamfer2" distance 3.3 angle 45 2 edges at (48, 2, 4) (28, 2, 4)
chamfer "Chamfer3" distance 4 angle 45 2 edges at (48, 2, 14) (28, 2, 14)
sketch "Sketch19" plane through (-10.5, -70.7, 4) normal (0, 1, 0) x (1, 0, 0)
  line L0 (0, -3.3) -> (94, -3.3) projected
  line L1 (94, 0) -> (94, -3.3) projected
  line L2 (0, 0) -> (94, 0) projected
  line L3 (0, -3.3) -> (0, 0) projected
  point P0 (10.5, 4)
extrude "Extrusion19" add sketch "Sketch19" along normal blind 0.2
sketch "Sketch20" plane through (-4, -4, 7) normal (0, -1, 0) x (1, 0, 0)
  line L0 (2.5, -3) -> (5.5, -3) projected
  line L1 (8, -3) -> (0, -3) projected
  line L2 (8, -3) -> (8, 0) projected
  line L3 (0, 0) -> (8, 0) projected
  line L4 (0, -3) -> (0, 0) projected
  line L5 (84, -3) -> (76, -3) projected
  line L6 (84, -3) -> (84, 0) projected
  line L7 (84, 0) -> (76, 0) projected
  line L8 (76, -3) -> (76, 0) projected
  point P0 (4, -7)
extrude "Extrusion20" add sketch "Sketch20" along normal blind 2
sketch "Sketch21" plane through (0, 0, 2) normal (0, 0, -1) x (-1, 0, 0)
  line L0 (4, -4) -> (27, -4) projected
  line L1 (-80, -15) -> (-99, -15) projected
  line L2 (-99, -74) -> (-99, -15) projected
  line L3 (-99, -15) -> (-80, -15)
  line L4 (-80, -15) -> (-80, -4)
  line L5 (-80, -4) -> (-99, -4)
  line L6 (-99, -4) -> (-99, -15)
  point P0 (0, 0)
extrude "Extrusion21" add sketch "Sketch21" against normal up to surface (2 mm away)
sketch "Sketch22" plane through (83.5, -15, 7.3) normal (0, 1, 0) x (1, 0, 0)
  line L0 (15.5, 3.3) -> (0, 3.3) projected
  line L1 (0, 0) -> (0, 3.3) projected
  line L2 (3.5, 0) -> (0, 0) projected
  line L3 (3.5, 2.3) -> (3.5, 0) projected
  line L4 (3.5, 2.3) -> (15.5, 2.3) projected
  line L5 (15.5, 2.3) -> (15.5, 3.3) projected
  line L6 (0, 0) -> (0, -4) projected
  line L7 (3.5, -4) -> (0, -4) projected
  line L8 (3.5, -4) -> (3.5, 0) projected
  line L9 (3.5, 0) -> (0, 0) projected
  point P0 (-83.5, 7.3)
extrude "Extrusion22" add sketch "Sketch22" along normal up to surface (11 mm away) contours L5 L4 L3 L2 L1 L0
sketch "Sketch23" plane through (0, 0, 4) normal (0, 0, 1) x (1, 0, 0)
  line L0 (83.5, -70.5) -> (83.5, -4) projected
  line L1 (80, -4) -> (83.5, -4) projected
  line L2 (80, -6) -> (80, -4) projected
  line L3 (80, -6) -> (72, -6) projected
  line L4 (72, -6) -> (72, 4) projected
  line L5 (72, 4) -> (51.3, 4) projected
  line L6 (51.3, 0) -> (51.3, 4) projected
  line L7 (51.3, 0) -> (44, 0) projected
  line L8 (44, 0) -> (44, 4) projected
  line L9 (44, 4) -> (40, 4) projected
  line L10 (40, 4) -> (40, 0) projected
  line L11 (40, 0) -> (36, 0) projected
  line L12 (36, 0) -> (36, 4) projected
  line L13 (36, 4) -> (32, 4) projected
  line L14 (32, 4) -> (32, 0) projected
  line L15 (32, 0) -> (24.7, 0) projected
  line L16 (24.7, 4) -> (24.7, 0) projected
  line L17 (24.7, 4) -> (4, 4) projected
  line L18 (4, 4) -> (4, -6) projected
  line L19 (4, -6) -> (-4, -6) projected
  line L20 (-4, -6) -> (-4, -4) projected
  line L21 (-4, -4) -> (-10.5, -4) projected
  line L22 (-10.5, -4) -> (-10.5, -70.5) projected
  line L23 (-10.5, -70.5) -> (83.5, -70.5) projected
  circle A0 centre (76, -52) radius 1.5 projected
  circle A1 centre (0, -52) radius 1.5 projected
  circle A2 centre (-5, -12) radius 1.5 projected
  circle A3 centre (81, -20) radius 1.5 projected
  circle A4 centre (-5, -12) radius 1.5 projected
  line L24 (-5, -12) -> (-5, -8.5)
  circle A5 centre (81, -20) radius 1.5 projected
  line L25 (81, -20) -> (81, -16.5)
  circle A6 centre (-5, -8.5) radius 1.5
  circle A7 centre (81, -16.5) radius 1.5
  point P0 (0, 0)
  dimension "d102" = 3.5
  dimension "d103" = 3.5
  dimension "d104" = 3
  dimension "d105" = 3
extrude "Extrusion23" cut sketch "Sketch23" against normal through all contours A6 | A7
sketch "Sketch24" plane through (0, 0, 4) normal (0, 0, 1) x (1, 0, 0)
  circle A0 centre (-5, -12) radius 1.5 projected
  circle A1 centre (81, -20) radius 1.5 projected
  point P0 (0, 0)
extrude "Extrusion24" add sketch "Sketch24" against normal up to surface (2 mm away)
sketch "Sketch25" plane through (-27, -74, 2) normal (-1, 0, 0) x (0, 0, 1)
  line L0 (0, 70) -> (0, 0) projected
  line L1 (0, 0) -> (3, 0) projected
  line L2 (3, 0) -> (3, 70) projected
  line L3 (3, 70) -> (0, 70) projected
  point P0 (-2, 74)
extrude "Extrusion25" cut sketch "Sketch25" against normal blind 1
sketch "Sketch26" plane through (99, -74, 5) normal (1, 0, 0) x (0, 0, -1)
  line L0 (0, 0) -> (0, 70) projected
  line L1 (3, 0) -> (0, 0) projected
  line L2 (3, 70) -> (3, 0) projected
  line L3 (3, 70) -> (0, 70) projected
  point P0 (5, 74)
extrude "Extrusion26" add sketch "Sketch26" along normal blind 0.5
properties part number "odroid_router"
